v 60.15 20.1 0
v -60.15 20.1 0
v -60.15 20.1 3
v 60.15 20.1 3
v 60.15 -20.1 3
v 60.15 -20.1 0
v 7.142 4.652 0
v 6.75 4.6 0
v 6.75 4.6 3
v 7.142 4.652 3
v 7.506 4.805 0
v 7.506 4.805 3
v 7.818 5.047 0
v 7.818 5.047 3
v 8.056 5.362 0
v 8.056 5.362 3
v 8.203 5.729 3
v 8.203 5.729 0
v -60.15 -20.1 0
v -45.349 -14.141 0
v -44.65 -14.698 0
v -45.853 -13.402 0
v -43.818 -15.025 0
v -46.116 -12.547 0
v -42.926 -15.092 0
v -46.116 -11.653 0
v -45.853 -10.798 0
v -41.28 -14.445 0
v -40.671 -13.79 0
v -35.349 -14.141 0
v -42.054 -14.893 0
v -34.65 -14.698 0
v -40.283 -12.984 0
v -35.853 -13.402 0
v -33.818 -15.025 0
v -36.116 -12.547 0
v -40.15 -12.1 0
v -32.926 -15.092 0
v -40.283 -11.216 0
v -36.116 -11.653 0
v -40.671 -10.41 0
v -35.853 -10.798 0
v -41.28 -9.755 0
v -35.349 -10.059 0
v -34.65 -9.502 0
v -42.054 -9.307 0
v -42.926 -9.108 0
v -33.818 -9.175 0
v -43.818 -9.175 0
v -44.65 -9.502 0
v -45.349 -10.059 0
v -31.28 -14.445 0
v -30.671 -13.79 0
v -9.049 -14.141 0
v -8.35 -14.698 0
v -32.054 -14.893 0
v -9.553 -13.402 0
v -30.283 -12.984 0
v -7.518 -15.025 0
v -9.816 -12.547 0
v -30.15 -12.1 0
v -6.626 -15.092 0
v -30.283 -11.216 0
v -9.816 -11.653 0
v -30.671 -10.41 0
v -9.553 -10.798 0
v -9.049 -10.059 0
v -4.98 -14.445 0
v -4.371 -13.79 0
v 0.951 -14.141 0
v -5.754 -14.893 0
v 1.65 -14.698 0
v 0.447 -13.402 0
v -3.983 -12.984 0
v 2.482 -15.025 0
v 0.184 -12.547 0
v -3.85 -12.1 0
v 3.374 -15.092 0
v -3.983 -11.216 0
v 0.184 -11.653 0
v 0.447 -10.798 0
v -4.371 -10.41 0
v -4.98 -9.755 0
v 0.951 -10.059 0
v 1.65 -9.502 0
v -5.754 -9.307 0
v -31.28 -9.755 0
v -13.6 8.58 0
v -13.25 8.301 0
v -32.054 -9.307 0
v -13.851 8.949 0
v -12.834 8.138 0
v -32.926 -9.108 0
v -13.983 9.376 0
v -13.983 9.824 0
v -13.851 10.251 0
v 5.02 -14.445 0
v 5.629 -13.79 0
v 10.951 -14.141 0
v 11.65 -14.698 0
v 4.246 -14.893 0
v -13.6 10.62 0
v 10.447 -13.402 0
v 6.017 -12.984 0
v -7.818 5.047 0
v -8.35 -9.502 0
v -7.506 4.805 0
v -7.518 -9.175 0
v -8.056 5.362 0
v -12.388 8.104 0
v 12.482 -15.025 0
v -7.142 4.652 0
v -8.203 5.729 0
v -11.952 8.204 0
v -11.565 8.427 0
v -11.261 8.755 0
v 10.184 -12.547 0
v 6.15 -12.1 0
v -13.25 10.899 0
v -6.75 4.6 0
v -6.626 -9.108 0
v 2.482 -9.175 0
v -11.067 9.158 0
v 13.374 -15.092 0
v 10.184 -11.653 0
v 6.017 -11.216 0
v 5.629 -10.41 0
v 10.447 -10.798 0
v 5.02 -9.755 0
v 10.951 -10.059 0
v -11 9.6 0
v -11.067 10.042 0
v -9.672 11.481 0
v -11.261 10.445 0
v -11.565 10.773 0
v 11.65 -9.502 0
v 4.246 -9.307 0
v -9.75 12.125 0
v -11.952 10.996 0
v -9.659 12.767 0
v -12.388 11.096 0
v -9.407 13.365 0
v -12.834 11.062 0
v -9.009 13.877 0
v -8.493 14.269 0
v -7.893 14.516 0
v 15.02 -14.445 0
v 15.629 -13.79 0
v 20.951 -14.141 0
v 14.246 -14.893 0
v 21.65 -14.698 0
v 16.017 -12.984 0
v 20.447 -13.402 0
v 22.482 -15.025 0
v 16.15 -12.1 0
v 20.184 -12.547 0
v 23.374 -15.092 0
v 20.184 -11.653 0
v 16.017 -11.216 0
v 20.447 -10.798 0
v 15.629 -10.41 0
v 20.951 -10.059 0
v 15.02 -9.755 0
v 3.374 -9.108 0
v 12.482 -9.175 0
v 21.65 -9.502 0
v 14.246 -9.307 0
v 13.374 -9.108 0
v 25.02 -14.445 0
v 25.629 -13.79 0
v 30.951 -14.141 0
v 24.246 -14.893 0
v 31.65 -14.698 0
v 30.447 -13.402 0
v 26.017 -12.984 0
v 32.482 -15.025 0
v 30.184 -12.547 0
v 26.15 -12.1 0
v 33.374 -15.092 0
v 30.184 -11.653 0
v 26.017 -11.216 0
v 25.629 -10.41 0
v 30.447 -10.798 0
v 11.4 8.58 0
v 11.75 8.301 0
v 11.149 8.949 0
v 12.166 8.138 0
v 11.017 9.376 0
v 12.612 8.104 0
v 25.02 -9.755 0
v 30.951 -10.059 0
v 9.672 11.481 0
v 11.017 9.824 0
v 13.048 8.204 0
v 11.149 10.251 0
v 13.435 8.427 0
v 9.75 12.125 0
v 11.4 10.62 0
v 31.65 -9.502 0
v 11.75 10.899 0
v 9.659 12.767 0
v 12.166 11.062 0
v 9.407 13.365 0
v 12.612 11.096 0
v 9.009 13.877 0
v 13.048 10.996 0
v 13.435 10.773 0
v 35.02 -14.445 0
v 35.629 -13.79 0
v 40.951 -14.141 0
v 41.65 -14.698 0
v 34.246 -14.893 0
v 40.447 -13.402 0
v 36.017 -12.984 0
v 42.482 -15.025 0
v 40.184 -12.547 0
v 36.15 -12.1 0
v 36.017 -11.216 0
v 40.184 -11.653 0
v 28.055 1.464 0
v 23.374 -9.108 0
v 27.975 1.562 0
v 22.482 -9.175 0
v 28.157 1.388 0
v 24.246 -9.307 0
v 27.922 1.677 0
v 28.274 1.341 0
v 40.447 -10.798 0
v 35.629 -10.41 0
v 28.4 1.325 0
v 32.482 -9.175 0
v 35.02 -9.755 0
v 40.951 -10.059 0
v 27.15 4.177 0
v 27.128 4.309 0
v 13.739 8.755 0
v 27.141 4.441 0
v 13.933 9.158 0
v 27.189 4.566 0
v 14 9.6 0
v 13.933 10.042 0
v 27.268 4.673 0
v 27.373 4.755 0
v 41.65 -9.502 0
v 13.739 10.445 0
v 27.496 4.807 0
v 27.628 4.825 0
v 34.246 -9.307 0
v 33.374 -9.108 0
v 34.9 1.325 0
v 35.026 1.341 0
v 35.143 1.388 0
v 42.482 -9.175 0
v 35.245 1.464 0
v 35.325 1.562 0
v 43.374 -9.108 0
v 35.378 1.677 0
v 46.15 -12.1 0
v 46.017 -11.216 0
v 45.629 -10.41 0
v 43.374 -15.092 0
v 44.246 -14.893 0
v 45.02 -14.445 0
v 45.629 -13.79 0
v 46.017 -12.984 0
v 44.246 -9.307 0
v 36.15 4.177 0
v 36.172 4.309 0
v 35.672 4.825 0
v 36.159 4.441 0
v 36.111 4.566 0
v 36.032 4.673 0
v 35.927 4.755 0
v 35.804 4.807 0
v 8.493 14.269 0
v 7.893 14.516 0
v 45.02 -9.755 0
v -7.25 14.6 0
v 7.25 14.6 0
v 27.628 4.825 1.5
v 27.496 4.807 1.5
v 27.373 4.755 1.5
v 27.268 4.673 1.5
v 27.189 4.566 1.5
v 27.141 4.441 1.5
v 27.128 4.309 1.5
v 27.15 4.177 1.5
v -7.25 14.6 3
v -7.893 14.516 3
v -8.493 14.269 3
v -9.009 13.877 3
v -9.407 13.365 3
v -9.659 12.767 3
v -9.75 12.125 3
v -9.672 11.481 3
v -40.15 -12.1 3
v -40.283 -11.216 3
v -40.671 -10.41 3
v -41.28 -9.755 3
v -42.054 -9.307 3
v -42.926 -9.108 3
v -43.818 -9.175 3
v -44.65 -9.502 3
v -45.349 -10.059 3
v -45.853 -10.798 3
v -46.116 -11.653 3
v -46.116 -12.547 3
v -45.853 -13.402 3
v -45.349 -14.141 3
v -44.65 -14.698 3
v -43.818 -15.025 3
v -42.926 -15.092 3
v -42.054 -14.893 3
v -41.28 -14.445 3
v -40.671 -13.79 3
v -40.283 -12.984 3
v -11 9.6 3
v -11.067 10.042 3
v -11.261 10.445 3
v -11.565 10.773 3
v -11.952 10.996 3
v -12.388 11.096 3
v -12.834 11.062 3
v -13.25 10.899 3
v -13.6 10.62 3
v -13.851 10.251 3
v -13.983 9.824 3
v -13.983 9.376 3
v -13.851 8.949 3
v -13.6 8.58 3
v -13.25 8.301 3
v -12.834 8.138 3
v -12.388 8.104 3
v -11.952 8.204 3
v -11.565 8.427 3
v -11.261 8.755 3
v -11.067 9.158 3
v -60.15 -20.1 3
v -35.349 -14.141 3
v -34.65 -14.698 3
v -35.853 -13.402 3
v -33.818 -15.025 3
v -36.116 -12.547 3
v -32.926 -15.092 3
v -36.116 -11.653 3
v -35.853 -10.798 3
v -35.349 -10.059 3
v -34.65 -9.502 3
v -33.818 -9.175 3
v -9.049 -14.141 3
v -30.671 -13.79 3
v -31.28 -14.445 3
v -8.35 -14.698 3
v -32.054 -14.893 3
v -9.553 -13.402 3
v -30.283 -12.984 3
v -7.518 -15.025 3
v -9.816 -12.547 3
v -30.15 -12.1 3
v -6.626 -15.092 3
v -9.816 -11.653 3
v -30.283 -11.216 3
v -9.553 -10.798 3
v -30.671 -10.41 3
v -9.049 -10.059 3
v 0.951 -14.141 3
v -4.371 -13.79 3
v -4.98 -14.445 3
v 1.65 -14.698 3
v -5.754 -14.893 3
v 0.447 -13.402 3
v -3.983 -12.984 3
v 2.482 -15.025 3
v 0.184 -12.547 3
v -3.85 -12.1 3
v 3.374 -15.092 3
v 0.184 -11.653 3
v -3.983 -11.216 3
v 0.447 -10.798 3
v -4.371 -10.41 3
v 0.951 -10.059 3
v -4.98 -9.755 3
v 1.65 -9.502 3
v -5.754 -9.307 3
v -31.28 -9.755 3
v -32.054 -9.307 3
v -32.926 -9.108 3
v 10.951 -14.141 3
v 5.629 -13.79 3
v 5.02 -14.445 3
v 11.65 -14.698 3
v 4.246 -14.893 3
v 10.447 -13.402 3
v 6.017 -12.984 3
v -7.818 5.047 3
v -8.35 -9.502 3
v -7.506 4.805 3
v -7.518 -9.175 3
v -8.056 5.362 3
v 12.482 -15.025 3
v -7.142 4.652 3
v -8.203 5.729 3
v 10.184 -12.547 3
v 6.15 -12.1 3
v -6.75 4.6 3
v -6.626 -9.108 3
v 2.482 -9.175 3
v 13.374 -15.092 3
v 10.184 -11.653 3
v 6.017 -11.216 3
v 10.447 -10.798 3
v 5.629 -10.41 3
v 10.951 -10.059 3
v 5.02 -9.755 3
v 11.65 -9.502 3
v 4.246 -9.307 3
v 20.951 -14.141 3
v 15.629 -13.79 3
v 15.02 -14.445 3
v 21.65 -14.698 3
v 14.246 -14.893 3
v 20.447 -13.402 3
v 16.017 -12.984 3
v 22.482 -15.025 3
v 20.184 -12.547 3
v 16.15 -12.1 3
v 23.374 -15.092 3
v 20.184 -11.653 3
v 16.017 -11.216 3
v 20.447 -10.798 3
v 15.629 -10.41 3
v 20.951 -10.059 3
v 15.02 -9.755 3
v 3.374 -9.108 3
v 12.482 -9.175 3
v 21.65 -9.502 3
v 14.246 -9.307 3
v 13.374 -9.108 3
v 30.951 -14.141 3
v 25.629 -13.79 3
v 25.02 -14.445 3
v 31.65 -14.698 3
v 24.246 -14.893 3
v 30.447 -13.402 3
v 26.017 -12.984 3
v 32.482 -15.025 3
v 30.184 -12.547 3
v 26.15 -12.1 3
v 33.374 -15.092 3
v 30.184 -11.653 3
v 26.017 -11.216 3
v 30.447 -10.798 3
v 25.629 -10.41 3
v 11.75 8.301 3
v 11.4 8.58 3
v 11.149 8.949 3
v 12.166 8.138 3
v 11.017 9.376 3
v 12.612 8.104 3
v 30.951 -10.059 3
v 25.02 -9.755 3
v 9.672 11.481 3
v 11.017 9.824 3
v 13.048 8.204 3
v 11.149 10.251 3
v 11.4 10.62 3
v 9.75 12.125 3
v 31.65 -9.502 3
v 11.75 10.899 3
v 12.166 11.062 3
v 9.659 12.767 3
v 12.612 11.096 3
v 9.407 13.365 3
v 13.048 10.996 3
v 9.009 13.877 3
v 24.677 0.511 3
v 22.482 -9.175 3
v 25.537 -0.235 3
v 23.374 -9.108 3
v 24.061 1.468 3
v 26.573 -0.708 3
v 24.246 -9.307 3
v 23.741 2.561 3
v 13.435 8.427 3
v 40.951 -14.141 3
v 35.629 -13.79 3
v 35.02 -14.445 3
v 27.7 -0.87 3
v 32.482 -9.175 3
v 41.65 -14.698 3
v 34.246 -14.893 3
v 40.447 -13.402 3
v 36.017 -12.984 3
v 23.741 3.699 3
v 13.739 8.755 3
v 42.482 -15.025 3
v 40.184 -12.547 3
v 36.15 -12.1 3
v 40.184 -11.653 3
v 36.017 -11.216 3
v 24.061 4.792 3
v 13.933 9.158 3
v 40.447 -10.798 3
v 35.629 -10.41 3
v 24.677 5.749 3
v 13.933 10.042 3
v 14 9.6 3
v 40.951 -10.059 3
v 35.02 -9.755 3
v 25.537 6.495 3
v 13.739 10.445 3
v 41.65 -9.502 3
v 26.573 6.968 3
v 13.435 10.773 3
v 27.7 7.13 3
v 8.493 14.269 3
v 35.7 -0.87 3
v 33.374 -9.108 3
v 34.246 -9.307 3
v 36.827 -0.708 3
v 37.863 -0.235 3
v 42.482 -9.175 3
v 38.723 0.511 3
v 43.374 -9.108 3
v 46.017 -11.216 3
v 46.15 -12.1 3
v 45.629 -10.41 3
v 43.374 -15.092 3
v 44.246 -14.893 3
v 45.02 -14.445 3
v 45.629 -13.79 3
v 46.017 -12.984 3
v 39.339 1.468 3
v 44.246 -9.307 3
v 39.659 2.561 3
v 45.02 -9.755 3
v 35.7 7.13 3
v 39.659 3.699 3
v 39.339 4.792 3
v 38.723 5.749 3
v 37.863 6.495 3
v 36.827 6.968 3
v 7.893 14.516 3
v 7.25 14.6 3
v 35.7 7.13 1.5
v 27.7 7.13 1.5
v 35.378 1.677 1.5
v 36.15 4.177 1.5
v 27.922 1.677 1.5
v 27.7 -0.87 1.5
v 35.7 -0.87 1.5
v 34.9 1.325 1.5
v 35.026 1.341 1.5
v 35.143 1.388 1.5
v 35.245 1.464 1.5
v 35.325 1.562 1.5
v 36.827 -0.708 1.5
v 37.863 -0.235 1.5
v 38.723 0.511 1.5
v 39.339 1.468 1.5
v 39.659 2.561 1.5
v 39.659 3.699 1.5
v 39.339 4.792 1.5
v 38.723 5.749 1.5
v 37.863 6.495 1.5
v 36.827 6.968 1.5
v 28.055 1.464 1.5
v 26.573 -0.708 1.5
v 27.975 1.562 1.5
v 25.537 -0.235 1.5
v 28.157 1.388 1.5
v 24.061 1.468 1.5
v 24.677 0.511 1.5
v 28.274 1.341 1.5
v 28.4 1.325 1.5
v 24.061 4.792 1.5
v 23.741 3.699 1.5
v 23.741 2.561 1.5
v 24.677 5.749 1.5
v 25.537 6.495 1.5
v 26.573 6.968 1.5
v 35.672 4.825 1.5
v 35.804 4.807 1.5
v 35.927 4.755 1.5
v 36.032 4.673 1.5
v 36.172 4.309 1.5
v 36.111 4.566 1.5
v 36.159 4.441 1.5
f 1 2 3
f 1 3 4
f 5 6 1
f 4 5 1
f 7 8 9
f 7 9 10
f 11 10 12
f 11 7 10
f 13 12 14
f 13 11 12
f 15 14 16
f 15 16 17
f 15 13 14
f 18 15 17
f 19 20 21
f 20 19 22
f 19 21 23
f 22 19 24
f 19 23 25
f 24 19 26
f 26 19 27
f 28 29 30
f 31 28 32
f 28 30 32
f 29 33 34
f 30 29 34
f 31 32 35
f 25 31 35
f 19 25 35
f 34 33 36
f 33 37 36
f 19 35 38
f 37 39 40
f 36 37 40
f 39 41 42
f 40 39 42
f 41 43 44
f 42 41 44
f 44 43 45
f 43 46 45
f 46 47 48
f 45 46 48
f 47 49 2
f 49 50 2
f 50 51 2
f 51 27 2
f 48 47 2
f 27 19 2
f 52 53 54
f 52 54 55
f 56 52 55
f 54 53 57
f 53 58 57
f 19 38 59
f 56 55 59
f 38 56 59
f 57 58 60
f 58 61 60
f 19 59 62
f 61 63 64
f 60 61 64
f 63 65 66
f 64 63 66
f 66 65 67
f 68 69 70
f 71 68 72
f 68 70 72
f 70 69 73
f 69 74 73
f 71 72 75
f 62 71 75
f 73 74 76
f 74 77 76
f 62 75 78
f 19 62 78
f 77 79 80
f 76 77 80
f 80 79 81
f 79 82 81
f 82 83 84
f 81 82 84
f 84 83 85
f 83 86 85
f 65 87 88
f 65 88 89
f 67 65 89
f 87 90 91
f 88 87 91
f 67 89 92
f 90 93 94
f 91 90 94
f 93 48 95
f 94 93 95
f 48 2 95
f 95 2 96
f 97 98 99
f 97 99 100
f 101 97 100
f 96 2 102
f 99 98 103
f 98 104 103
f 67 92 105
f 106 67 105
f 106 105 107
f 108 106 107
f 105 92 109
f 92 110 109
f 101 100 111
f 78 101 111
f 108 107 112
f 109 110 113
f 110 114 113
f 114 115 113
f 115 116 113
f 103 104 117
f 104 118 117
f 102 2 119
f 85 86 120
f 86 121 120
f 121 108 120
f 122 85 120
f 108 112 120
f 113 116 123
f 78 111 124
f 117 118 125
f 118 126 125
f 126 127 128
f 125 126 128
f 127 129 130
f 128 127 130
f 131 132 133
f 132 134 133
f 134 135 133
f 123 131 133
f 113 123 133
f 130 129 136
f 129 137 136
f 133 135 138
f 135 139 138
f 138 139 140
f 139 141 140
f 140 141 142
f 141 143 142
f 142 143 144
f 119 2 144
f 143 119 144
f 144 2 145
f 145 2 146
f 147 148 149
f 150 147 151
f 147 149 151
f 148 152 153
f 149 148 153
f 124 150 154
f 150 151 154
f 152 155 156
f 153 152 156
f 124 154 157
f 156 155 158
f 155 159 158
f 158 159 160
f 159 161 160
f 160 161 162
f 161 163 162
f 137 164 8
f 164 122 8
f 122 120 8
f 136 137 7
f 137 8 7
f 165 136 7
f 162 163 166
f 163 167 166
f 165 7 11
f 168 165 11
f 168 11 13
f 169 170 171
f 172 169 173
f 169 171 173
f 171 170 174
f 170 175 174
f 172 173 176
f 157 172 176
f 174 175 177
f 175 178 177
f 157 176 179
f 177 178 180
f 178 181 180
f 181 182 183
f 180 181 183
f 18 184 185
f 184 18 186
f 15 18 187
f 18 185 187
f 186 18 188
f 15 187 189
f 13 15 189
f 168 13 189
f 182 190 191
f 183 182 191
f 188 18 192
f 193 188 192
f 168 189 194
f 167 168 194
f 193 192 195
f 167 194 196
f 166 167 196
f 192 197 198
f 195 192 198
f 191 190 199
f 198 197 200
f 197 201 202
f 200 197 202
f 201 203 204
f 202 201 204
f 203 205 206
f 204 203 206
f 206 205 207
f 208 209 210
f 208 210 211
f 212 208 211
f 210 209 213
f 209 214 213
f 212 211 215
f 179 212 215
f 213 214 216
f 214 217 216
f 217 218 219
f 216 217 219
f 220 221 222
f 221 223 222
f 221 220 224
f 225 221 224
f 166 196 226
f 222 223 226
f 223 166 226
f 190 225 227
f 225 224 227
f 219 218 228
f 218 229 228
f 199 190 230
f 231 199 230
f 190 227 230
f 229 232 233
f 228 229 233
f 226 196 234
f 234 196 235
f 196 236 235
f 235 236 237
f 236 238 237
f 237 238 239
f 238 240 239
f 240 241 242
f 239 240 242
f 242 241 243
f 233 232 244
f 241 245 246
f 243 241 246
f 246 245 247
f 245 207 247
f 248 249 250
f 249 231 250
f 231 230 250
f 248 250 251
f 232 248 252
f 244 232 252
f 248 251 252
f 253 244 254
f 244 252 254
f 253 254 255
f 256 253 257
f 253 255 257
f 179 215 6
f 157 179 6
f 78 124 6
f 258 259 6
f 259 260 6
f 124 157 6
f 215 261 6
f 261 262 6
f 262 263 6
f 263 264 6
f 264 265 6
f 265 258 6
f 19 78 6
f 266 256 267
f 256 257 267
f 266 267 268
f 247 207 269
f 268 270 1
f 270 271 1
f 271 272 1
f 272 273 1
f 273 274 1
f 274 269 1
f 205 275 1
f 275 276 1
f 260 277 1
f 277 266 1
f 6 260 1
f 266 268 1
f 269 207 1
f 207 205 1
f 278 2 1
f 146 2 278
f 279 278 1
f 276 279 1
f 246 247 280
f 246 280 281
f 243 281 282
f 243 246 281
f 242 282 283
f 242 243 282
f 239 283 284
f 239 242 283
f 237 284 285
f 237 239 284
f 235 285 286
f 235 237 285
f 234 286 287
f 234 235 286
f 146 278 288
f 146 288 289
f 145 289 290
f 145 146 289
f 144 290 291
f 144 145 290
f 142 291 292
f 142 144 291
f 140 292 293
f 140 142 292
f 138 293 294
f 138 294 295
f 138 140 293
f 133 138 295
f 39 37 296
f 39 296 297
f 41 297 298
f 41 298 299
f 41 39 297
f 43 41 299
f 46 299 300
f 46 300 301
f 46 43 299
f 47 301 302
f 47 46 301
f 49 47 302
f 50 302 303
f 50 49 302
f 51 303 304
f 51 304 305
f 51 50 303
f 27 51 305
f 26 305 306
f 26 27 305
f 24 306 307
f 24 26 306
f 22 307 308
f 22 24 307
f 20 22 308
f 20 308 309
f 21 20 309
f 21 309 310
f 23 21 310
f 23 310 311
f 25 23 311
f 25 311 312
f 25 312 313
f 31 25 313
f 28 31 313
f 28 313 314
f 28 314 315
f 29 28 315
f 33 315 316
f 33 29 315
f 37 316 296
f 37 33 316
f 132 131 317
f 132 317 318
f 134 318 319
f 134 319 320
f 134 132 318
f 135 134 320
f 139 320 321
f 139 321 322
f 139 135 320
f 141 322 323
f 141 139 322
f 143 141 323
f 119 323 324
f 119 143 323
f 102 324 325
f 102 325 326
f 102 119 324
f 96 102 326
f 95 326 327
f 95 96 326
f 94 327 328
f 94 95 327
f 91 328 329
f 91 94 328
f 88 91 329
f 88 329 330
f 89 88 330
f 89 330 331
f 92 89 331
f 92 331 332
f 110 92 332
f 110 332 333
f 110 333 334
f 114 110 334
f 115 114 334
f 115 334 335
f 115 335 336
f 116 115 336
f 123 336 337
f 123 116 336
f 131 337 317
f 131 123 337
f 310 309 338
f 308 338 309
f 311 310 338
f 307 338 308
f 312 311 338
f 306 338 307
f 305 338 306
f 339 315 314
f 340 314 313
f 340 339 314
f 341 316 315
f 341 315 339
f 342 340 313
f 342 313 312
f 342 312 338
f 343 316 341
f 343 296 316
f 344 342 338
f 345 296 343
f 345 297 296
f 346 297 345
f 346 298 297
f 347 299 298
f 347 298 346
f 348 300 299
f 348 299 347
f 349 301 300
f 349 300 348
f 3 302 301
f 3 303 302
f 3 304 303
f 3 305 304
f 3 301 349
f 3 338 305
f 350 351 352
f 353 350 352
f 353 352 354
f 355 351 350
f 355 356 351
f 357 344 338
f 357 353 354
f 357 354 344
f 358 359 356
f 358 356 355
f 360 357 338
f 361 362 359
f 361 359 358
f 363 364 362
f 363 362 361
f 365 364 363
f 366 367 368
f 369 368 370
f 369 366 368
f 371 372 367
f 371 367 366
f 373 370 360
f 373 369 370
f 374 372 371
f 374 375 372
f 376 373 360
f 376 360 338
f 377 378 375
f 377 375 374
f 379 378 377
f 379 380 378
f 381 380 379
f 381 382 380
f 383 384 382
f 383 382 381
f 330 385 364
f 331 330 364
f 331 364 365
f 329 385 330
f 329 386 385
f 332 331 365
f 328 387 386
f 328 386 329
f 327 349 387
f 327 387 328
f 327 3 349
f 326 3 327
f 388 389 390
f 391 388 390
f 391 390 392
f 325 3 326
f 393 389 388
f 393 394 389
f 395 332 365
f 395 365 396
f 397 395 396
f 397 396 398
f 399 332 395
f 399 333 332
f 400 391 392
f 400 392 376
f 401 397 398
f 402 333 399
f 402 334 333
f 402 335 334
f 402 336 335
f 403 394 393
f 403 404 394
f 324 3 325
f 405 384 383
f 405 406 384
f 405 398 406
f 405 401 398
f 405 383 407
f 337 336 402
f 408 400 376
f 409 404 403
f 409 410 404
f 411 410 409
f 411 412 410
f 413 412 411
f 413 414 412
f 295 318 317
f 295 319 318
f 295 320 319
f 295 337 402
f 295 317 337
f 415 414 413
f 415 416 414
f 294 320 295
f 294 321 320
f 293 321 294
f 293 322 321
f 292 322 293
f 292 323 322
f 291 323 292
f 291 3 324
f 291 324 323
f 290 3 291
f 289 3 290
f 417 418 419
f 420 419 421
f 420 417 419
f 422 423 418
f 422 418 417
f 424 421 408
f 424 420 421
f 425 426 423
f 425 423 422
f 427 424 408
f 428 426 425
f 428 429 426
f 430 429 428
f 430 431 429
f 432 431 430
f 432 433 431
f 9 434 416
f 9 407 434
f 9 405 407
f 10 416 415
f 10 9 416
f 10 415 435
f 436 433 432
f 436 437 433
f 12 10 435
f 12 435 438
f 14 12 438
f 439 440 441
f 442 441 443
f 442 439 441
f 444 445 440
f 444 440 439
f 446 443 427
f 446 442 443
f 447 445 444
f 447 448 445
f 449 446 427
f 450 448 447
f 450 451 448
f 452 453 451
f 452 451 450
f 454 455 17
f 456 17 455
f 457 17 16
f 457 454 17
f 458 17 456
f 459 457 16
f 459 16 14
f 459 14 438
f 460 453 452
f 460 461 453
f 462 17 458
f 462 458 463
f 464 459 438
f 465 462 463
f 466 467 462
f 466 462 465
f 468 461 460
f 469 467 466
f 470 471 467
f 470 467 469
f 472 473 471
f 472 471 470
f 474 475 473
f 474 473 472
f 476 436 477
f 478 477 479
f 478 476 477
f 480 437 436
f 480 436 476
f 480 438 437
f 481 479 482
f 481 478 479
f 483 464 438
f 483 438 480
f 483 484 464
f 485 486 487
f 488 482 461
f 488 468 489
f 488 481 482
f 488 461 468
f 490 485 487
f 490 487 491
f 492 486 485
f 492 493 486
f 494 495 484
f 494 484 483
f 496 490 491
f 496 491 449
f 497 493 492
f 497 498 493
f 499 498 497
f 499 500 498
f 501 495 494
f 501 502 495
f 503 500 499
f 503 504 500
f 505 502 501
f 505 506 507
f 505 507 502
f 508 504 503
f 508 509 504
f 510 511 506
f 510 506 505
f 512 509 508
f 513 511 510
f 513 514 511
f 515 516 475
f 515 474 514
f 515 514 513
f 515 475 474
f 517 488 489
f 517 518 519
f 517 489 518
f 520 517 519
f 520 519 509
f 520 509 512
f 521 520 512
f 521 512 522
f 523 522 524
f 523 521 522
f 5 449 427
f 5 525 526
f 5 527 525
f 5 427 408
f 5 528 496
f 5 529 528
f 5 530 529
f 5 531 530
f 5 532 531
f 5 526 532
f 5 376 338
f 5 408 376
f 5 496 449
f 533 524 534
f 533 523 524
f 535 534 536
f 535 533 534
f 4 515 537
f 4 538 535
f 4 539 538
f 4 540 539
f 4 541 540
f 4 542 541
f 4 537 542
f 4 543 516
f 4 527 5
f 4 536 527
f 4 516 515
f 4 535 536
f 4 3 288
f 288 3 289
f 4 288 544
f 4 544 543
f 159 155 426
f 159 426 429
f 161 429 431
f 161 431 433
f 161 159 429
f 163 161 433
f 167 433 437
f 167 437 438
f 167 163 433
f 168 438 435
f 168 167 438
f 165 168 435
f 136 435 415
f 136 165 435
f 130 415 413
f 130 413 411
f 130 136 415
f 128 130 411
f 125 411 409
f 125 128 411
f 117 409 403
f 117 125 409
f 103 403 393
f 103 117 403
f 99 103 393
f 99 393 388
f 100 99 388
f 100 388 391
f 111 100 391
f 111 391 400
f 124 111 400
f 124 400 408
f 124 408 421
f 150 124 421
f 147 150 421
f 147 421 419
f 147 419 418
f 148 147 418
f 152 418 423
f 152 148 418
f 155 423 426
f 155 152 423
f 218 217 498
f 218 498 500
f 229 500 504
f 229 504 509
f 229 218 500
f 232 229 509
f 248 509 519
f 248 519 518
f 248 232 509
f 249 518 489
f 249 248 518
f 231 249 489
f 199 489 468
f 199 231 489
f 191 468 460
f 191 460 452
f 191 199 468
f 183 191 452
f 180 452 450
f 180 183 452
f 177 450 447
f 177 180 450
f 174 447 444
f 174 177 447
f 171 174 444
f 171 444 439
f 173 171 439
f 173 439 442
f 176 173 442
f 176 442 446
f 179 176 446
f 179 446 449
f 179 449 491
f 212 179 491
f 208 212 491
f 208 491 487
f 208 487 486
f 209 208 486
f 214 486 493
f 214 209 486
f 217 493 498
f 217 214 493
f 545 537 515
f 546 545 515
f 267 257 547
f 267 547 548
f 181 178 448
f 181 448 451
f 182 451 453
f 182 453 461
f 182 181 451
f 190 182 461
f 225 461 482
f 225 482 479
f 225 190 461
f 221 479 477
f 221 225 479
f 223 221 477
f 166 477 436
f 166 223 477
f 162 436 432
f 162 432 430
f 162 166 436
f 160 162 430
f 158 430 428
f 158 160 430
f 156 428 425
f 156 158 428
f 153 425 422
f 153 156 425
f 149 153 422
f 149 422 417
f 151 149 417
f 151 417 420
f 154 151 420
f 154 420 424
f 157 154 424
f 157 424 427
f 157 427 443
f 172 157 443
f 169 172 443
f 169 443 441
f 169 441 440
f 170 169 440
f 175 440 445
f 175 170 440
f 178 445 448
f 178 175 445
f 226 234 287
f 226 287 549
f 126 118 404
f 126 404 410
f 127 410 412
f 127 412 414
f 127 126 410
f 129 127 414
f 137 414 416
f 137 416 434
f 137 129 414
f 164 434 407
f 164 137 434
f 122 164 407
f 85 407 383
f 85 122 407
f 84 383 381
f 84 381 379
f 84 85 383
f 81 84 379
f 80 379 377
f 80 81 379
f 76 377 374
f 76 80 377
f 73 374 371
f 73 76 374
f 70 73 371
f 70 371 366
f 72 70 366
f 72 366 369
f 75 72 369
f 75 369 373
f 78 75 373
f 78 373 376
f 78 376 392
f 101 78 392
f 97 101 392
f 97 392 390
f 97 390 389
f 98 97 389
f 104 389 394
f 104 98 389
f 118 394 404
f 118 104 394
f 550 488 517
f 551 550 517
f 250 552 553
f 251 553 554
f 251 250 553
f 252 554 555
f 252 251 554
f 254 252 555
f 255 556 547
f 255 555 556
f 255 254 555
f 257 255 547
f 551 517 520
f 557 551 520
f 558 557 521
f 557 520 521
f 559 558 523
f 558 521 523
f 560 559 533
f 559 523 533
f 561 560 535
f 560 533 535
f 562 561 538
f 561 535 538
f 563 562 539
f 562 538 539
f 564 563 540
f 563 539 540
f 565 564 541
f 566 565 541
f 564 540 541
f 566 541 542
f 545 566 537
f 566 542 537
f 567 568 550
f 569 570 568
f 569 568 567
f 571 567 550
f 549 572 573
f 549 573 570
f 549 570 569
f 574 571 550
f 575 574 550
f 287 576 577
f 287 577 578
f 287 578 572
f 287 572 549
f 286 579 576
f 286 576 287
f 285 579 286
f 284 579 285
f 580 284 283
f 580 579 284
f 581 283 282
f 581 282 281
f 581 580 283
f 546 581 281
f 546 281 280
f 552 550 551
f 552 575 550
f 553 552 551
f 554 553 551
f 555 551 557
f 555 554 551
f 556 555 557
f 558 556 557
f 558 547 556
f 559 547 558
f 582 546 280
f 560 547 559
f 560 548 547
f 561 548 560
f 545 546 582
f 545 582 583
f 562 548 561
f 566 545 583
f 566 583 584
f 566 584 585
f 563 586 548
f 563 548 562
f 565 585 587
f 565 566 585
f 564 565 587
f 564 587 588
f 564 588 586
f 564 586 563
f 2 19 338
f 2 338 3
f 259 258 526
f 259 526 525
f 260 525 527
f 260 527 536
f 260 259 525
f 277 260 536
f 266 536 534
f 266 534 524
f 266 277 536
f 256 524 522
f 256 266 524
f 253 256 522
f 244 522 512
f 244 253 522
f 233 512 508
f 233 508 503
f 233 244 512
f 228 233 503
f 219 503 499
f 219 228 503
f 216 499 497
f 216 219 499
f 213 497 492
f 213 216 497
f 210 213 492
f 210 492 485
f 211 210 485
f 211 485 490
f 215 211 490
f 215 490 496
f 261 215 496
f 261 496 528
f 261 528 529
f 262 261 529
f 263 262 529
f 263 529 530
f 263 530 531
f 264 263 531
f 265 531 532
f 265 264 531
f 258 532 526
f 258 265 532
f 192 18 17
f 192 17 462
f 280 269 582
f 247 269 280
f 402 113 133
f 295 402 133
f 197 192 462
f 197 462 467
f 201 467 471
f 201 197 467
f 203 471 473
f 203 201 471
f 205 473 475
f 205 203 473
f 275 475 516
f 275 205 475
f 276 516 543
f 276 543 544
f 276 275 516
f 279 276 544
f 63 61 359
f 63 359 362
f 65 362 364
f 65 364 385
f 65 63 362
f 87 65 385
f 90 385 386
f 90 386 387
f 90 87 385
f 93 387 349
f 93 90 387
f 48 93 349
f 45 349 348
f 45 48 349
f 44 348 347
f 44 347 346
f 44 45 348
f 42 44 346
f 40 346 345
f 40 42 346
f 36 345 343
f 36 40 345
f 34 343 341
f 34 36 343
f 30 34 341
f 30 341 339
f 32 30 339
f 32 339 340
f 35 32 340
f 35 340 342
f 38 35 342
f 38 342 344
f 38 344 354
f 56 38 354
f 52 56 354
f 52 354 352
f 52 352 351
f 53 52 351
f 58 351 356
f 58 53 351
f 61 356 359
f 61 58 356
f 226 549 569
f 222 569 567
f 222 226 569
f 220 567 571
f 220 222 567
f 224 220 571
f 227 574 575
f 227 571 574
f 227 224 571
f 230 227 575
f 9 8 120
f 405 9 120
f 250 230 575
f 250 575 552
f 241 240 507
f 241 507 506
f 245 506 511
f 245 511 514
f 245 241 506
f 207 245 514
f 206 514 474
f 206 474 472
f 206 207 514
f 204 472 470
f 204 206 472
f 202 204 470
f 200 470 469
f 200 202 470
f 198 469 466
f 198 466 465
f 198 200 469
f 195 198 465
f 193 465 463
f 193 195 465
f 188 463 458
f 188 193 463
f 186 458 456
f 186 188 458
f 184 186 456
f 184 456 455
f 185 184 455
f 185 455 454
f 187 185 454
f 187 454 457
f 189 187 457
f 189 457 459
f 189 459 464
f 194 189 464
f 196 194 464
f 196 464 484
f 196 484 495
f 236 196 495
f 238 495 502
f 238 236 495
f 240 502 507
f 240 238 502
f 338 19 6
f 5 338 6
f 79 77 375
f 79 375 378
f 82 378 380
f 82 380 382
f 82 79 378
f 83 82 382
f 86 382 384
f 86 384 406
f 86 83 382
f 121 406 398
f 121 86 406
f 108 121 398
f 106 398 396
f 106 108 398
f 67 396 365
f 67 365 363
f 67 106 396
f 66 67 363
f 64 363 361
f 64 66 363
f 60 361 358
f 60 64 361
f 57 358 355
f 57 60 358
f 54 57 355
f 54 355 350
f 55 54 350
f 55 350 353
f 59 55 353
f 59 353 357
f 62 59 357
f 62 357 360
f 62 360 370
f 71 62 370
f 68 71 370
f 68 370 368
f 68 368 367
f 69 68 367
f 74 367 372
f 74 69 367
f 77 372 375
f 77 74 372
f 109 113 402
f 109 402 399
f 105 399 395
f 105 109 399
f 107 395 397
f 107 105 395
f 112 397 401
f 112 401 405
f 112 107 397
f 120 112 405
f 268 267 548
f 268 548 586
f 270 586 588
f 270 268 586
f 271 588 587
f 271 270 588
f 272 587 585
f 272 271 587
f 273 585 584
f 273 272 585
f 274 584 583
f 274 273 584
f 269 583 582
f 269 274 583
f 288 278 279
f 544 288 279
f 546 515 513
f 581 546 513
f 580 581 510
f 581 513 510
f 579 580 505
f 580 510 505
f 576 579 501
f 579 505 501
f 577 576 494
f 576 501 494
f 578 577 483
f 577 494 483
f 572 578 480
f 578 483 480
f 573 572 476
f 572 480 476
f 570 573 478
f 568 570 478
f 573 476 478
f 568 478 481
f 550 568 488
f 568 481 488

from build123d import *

# Parameters (mm, degrees)
SKETCH_W     = 120.3
SKETCH_H     = 40.2
SKETCH_R     = 1.5
SKETCH_R_2   = 3
PAD_DEPTH    = 3
POCKET_DEPTH = 1.5


with BuildPart() as part:
    # Sketch → Pad (new body)
    with BuildSketch(Plane.XY):
        Rectangle(SKETCH_W, SKETCH_H)
        with Locations((-12.5, 9.6)):
            Circle(SKETCH_R, mode=Mode.SUBTRACT)
        with Locations((12.5, 9.6)):
            Circle(SKETCH_R, mode=Mode.SUBTRACT)
        with Locations((43.15, -12.1)):
            Circle(SKETCH_R_2, mode=Mode.SUBTRACT)
        with Locations((33.15, -12.1)):
            Circle(SKETCH_R_2, mode=Mode.SUBTRACT)
        with Locations((23.15, -12.1)):
            Circle(SKETCH_R_2, mode=Mode.SUBTRACT)
        with Locations((13.15, -12.1)):
            Circle(SKETCH_R_2, mode=Mode.SUBTRACT)
        with Locations((3.15, -12.1)):
            Circle(SKETCH_R_2, mode=Mode.SUBTRACT)
        with Locations((-6.85, -12.1)):
            Circle(SKETCH_R_2, mode=Mode.SUBTRACT)
        with Locations((-33.15, -12.1)):
            Circle(SKETCH_R_2, mode=Mode.SUBTRACT)
        with Locations((-43.15, -12.1)):
            Circle(SKETCH_R_2, mode=Mode.SUBTRACT)
        with BuildLine():
            Line((28.4, 1.325), (34.9, 1.325))
            ThreePointArc((34.9, 1.325), (35.196827, 1.42264), (35.377726, 1.677426))
            Line((35.377726, 1.677426), (36.15, 4.177426))
            ThreePointArc((36.15, 4.177426), (36.074634, 4.621827), (35.672274, 4.825))
            Line((35.672274, 4.825), (27.627726, 4.825))
            ThreePointArc((27.627726, 4.825), (27.225366, 4.621827), (27.15, 4.177426))
            Line((27.15, 4.177426), (27.922274, 1.677426))
            ThreePointArc((27.922274, 1.677426), (28.103173, 1.42264), (28.4, 1.325))
        make_face(mode=Mode.SUBTRACT)
        with BuildLine():
            Line((-7.25, 14.6), (7.25, 14.6))
            ThreePointArc((9.672278, 11.481477), (9.224374, 13.633573), (7.25, 14.6))
            Line((8.203367, 5.728886), (9.672278, 11.481477))
            ThreePointArc((6.75, 4.6), (7.670144, 4.915375), (8.203367, 5.728886))
            Line((6.75, 4.6), (-6.75, 4.6))
            ThreePointArc((-8.203367, 5.728886), (-7.670144, 4.915375), (-6.75, 4.6))
            Line((-8.203367, 5.728886), (-9.672278, 11.481477))
            ThreePointArc((-7.25, 14.6), (-9.224374, 13.633573), (-9.672278, 11.481477))
        make_face(mode=Mode.SUBTRACT)
    extrude(amount=PAD_DEPTH)

    # Sketch001 (on Face32 of Pad) → Pocket (cut)
    with BuildSketch(Plane.XY.offset(3)):
        with BuildLine():
            ThreePointArc((27.7, 7.13), (23.7, 3.13), (27.7, -0.87))
            Line((27.7, -0.87), (35.7, -0.87))
            ThreePointArc((35.7, -0.87), (39.7, 3.13), (35.7, 7.13))
            Line((35.7, 7.13), (27.7, 7.13))
        make_face()
    extrude(amount=-POCKET_DEPTH, mode=Mode.SUBTRACT)


solid = part.part
